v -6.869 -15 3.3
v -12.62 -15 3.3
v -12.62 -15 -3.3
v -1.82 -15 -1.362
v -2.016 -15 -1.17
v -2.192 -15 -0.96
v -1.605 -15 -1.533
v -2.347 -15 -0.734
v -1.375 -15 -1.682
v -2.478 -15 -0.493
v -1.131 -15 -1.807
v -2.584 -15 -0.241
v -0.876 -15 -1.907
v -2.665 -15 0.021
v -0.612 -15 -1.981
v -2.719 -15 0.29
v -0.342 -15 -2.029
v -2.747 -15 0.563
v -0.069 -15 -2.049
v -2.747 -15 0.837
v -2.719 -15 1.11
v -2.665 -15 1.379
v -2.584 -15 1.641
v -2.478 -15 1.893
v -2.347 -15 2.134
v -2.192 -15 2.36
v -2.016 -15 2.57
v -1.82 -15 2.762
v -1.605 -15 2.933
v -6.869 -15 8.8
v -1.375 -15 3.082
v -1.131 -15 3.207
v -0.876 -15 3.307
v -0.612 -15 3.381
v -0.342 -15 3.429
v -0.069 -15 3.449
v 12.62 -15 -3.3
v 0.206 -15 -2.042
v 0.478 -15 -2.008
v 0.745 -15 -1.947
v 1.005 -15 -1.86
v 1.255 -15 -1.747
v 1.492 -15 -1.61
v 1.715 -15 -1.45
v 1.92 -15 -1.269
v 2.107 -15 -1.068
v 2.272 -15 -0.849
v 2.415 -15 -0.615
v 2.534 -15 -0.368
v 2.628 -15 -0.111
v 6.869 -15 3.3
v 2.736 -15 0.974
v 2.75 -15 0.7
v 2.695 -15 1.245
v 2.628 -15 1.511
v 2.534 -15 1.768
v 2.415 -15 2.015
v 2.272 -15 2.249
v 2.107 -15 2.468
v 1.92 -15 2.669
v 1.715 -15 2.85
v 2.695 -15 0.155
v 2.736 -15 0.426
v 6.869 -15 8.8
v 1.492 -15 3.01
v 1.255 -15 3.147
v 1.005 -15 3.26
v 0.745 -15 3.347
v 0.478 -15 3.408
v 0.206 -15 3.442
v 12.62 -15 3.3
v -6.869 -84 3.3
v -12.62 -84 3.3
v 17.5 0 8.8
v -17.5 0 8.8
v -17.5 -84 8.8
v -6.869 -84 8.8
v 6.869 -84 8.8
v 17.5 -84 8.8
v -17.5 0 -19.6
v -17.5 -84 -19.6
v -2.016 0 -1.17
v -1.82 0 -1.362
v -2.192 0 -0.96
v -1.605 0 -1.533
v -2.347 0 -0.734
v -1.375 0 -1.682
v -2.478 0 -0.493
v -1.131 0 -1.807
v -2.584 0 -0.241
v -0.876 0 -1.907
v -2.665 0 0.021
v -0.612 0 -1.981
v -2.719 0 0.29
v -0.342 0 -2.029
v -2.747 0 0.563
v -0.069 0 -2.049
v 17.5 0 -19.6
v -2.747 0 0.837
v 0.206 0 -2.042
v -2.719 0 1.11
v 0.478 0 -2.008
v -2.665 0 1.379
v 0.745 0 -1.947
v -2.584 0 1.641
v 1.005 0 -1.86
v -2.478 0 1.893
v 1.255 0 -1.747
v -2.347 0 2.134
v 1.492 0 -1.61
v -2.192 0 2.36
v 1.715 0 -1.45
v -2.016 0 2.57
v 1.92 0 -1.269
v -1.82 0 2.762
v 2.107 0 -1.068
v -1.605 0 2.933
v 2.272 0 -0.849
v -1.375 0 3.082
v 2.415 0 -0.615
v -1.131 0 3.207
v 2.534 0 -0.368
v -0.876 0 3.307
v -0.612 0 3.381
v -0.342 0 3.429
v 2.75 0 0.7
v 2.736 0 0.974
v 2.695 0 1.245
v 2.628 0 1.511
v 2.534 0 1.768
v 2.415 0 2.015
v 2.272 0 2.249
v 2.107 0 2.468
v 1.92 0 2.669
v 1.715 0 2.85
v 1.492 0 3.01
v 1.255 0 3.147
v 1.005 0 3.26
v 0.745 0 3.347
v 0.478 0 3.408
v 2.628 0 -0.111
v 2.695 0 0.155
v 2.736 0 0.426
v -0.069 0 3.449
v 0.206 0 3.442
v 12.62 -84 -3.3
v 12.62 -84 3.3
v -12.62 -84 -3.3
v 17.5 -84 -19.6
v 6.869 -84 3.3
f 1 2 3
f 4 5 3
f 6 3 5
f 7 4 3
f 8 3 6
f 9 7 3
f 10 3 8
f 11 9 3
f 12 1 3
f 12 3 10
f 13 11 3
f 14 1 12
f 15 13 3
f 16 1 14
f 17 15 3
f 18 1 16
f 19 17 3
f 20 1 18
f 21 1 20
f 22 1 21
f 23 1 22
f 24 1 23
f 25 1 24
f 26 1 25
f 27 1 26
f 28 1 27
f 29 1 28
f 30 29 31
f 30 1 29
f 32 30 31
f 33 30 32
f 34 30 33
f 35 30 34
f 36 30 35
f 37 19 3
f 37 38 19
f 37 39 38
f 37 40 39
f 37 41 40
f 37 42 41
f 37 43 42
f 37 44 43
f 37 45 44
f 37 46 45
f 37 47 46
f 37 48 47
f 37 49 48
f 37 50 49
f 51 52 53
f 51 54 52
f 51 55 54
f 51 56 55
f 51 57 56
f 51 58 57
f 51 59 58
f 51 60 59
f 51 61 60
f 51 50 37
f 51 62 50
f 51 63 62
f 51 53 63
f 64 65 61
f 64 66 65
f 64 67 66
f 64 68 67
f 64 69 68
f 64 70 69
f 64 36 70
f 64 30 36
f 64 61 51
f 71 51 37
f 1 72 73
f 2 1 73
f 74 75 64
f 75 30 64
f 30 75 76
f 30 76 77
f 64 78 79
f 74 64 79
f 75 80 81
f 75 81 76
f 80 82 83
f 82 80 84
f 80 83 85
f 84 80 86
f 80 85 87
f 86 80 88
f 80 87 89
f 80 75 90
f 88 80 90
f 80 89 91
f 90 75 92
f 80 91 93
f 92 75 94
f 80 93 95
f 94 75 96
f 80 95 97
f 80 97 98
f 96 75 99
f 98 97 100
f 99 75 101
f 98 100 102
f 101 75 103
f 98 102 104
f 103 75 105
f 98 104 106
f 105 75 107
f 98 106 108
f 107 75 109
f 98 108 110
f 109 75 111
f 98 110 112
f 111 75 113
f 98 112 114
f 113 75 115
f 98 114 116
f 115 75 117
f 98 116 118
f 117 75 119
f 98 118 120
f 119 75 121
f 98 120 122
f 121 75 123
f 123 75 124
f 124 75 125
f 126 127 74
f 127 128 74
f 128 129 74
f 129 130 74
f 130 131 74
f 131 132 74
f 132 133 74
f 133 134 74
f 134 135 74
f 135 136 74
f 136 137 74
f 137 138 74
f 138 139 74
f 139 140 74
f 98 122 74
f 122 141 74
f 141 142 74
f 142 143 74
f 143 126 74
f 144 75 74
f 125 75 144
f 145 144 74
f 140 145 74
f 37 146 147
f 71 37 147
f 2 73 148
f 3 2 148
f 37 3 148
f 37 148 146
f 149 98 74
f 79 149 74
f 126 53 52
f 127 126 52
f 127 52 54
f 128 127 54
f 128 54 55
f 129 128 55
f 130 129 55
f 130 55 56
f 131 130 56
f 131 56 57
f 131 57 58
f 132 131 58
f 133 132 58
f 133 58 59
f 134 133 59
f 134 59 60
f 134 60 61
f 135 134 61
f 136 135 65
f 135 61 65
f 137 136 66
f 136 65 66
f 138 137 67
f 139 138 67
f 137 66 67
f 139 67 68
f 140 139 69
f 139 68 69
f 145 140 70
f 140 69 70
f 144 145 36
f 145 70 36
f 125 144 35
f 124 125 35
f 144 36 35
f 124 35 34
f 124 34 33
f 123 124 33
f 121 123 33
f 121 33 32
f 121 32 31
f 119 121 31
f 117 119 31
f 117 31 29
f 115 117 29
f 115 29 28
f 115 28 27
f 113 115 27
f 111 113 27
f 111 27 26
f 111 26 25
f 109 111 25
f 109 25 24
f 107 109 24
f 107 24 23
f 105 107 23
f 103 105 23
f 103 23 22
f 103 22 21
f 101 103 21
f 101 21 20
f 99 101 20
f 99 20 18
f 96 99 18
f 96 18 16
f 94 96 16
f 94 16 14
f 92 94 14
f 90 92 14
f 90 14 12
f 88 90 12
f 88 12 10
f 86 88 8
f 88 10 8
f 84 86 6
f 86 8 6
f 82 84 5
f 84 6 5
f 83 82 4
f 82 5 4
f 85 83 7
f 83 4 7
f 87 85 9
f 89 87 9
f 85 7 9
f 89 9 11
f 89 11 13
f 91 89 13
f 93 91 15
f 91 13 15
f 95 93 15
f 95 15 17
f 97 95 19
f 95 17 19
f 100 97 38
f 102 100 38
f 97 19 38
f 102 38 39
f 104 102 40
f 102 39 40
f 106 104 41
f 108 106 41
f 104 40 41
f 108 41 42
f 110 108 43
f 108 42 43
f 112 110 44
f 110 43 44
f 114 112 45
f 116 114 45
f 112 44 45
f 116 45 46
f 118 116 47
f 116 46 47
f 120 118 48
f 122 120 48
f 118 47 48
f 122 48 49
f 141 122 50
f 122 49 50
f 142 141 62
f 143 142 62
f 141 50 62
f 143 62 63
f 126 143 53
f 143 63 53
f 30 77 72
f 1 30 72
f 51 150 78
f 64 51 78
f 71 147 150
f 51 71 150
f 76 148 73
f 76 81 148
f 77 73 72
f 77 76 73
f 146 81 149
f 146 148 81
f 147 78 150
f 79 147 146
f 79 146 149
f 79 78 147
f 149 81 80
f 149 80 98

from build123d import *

# Parameters (mm, degrees)
F0_W     = 35
F0_H     = 39.2
F1_DEPTH = 84
F3_DEPTH = 69
F5_D     = 5.5
F6_W     = 35
F6_H     = 10.8
F7_DEPTH = 84.001


with BuildPart() as f1:
    # F0 (on Front) → F1 (new body)
    with BuildSketch(Plane.XZ):
        Rectangle(F0_W, F0_H)
    extrude(amount=F1_DEPTH)

    # F2 (on face) → F3 (cut)
    with BuildSketch(Plane.XZ.offset(84)):
        Polygon((12.62, -3.3), (12.62, 3.3), (6.8694977982, 3.3), (6.8694977982, 8.8), (-6.8694977982, 8.8), (-6.8694977982, 3.3), (-12.62, 3.3), (-12.62, -3.3), align=None)
    extrude(amount=-F3_DEPTH, mode=Mode.SUBTRACT)

    # F5 (through all)
    with Locations(Plane(origin=(0, 0, 0), x_dir=(-1, 0, 0), z_dir=(0, 1, 0))):
        with Locations((0, 0.7)):
            Hole(F5_D / 2)

    # F6 (on face) → F7 (cut, through all)
    with BuildSketch(Plane.XZ.offset(84)):
        with Locations((0, 14.2)):
            Rectangle(F6_W, F6_H)
    extrude(amount=-F7_DEPTH, mode=Mode.SUBTRACT)


solid = f1.part
